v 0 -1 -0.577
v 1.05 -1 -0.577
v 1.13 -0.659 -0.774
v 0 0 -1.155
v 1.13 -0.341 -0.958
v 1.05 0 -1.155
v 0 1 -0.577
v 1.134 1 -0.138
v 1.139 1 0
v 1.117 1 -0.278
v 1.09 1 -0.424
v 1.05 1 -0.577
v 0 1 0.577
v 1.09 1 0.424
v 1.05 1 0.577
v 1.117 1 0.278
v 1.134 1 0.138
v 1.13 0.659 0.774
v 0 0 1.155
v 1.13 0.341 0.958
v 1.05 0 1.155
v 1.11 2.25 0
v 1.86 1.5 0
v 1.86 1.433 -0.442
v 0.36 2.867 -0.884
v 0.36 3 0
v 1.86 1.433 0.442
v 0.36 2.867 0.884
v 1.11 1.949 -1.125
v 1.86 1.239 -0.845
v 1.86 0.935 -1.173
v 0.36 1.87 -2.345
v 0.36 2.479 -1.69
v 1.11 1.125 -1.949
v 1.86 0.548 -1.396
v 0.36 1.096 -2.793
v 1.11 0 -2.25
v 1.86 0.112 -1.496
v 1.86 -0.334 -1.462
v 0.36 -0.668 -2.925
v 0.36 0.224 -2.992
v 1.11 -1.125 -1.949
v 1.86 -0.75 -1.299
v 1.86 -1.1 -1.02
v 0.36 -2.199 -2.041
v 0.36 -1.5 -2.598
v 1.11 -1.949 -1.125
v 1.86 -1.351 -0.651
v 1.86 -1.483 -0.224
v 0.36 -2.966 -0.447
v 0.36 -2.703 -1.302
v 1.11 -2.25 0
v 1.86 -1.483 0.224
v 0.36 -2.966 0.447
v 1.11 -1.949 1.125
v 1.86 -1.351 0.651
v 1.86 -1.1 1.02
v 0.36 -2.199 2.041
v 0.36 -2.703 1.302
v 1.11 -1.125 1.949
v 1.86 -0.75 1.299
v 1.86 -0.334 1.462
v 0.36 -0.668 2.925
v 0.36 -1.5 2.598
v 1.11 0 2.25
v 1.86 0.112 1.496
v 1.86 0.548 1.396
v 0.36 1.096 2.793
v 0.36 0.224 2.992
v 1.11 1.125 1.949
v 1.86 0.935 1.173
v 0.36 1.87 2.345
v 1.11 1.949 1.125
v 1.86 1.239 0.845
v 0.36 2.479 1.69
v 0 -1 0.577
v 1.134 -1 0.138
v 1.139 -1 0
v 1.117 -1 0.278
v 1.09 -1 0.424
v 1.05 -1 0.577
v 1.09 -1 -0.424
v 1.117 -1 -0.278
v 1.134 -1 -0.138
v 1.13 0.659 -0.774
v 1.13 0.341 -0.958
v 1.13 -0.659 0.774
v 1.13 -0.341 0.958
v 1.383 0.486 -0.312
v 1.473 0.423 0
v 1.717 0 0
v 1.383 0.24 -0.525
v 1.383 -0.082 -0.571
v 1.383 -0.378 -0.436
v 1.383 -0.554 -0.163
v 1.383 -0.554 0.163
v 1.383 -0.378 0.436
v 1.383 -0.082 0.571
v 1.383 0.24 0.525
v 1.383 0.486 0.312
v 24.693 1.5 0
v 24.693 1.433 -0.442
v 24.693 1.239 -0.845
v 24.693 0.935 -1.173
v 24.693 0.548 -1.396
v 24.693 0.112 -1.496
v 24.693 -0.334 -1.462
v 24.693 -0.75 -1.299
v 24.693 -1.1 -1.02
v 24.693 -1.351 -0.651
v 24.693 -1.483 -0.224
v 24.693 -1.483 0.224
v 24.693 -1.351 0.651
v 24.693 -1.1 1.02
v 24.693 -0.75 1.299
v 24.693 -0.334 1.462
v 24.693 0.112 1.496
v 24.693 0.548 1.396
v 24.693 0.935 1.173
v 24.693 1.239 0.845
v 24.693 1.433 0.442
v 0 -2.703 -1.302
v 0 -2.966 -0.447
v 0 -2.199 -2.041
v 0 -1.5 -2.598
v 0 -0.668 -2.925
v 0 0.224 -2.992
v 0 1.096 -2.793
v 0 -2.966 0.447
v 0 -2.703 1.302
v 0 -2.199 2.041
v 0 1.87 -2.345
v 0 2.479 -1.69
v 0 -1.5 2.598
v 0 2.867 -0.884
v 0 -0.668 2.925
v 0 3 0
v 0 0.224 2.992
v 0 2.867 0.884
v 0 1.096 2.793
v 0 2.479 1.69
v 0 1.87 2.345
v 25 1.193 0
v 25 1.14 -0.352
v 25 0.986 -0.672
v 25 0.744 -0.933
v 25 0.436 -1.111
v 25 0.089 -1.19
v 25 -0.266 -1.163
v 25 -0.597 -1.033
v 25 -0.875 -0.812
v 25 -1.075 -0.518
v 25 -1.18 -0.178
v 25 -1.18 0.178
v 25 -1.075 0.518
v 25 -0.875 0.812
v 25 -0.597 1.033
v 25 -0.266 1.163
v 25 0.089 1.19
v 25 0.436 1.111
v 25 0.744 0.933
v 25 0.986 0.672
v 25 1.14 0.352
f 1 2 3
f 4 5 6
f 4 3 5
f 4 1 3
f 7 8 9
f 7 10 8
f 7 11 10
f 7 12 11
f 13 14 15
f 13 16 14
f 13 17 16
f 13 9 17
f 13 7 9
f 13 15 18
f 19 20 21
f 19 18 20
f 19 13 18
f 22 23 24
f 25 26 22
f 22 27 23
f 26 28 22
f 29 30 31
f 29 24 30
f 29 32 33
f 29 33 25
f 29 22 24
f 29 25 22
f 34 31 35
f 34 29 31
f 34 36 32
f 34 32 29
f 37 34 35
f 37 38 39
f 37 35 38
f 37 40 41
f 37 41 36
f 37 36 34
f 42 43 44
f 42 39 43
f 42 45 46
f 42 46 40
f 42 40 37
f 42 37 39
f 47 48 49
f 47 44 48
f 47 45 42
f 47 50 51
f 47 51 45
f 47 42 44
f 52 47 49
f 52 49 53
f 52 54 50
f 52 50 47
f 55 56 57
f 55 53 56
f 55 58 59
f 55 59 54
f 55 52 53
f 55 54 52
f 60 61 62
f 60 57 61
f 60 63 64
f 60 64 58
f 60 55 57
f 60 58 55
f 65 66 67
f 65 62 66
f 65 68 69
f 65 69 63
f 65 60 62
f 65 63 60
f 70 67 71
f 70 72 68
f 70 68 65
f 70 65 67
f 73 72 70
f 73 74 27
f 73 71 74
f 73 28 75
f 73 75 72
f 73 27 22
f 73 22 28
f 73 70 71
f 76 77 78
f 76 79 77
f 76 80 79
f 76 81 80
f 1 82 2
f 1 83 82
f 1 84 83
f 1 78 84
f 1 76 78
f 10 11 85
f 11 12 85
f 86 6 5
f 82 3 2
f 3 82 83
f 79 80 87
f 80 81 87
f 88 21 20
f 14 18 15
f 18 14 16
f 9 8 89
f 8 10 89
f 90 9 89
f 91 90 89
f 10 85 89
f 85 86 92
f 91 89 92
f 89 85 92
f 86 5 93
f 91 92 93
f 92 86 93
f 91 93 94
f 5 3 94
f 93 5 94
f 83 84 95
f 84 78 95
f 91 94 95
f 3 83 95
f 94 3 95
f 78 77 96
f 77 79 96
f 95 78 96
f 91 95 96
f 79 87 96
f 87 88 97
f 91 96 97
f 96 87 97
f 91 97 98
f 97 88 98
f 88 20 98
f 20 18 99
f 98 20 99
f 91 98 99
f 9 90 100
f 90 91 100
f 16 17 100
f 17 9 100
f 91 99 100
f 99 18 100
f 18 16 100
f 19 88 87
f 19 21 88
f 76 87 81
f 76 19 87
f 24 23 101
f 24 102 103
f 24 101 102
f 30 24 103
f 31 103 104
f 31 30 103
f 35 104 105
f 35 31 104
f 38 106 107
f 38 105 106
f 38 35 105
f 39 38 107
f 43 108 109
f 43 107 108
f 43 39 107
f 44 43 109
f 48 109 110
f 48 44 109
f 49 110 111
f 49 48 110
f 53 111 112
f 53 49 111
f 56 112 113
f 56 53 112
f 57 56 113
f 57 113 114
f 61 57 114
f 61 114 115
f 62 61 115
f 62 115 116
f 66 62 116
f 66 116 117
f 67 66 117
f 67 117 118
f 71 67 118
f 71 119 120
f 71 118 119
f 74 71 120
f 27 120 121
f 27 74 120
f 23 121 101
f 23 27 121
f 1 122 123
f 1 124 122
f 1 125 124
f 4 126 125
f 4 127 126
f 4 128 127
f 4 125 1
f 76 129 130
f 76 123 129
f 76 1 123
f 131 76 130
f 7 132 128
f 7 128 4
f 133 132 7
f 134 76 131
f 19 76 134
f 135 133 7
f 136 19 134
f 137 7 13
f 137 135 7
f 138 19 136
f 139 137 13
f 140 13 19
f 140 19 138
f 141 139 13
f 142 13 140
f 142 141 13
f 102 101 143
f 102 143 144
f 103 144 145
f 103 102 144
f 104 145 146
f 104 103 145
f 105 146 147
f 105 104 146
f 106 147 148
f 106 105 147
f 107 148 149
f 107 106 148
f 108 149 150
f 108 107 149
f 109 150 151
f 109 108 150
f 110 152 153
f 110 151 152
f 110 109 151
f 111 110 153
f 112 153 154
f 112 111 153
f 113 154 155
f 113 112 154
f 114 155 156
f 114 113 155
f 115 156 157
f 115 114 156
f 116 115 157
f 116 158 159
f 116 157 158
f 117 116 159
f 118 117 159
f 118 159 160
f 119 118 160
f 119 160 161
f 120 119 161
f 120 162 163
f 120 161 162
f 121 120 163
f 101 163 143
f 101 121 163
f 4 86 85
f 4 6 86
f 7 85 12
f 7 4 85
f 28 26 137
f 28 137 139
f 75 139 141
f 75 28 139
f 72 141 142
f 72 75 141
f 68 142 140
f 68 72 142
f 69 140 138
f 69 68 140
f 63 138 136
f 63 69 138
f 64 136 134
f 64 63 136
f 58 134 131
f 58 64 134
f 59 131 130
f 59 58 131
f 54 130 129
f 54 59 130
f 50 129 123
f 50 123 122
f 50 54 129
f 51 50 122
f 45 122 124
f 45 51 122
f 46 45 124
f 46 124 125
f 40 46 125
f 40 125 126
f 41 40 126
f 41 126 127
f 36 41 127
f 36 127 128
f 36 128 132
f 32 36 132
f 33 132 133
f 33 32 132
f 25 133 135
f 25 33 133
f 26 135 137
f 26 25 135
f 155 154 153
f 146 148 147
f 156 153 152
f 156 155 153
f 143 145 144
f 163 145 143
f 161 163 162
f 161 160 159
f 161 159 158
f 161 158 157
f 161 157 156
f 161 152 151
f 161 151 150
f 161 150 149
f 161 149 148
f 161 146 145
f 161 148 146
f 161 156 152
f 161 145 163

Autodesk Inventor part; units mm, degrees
ref_plane "YZ Plane" through (0, 0, 0) normal (1, 0, 0) x (0, 1, 0)
ref_plane "XZ Plane" through (0, 0, 0) normal (0, 1, 0) x (-1, 0, 0)
sketch "Sketch1" plane through (0, 0, 0) normal (0, 0, 1) x (1, 0, 0)
  line L0 (25, 0) -> (25, 1.5)
  line L1 (25, 1.5) -> (7, 1.5)
  line L2 (7, 1.5) -> (6.6933, 1.5)
  line L3 (0, 3) -> (0, 1.1547)
  line L4 (0, 1.1547) -> (1.05, 1.1547)
  line L5 (1.05, 1.1547) -> (1.7167, 0)
  line L6 (1.7167, 0) -> (25, 0)
  line L7 (0, 3) -> (0.36, 3)
  line L8 (0.36, 3) -> (1.86, 1.5)
  line L9 (6.6933, 1.5) -> (1.86, 1.5)
  line L10 (7, 1.5) -> (1.86, 1.5) construction
  line L11 (1.86, 1.5) -> (1.86, 1.5)
  line L12 (-5, 0) -> (30, 0) projected
  line L13 (0, -0.6) -> (0, 3.6) projected
  dimension "d0" = 25
  dimension "d1" = 18
  dimension "d2" = 1.05
  dimension "d3" = 3
  dimension "d6" = 1.86
  dimension "d7" = 45
  dimension "d8" = 2.3094
  dimension "d9" = 60
  dimension "d10" = 6
  dimension "d11" = 3
  dimension "d12" = 0.3067
revolve "Body" add sketch "Sketch1" angle 360 about axis through (1.7167, 0, 0) along (1, 0, 0) contours L6 L5 L4 L3 L7 L8 L9 L2 L1 L0
sketch "Sketch2" plane through (0, 0, 0) normal (-1, 0, 0) x (0, 0, 1)
  circle A0 centre (0, 0) radius 1.1547 projected
  line L0 (0, -4.2) -> (0, 4.2) projected
  line L1 (-4.2, 0) -> (4.2, 0) projected
  line L2 (1.1547, 0) -> (0.5774, -1)
  line L3 (0.5774, -1) -> (-0.5774, -1)
  line L4 (-0.5774, -1) -> (-1.1547, 0)
  line L5 (-1.1547, 0) -> (-0.5774, 1)
  line L6 (-0.5774, 1) -> (0.5774, 1)
  line L7 (0.5774, 1) -> (1.1547, 0)
  point P0 (0, 1.1547)
extrude "Slot" add sketch "Sketch2" against normal up to next contours L7 A0 | A0 L2 | L6 L0 A0 | A0 L0 L3 | L0 L6 A0 | A0 L3 L0 | L4 A0 | A0 L5
thread "Thread" size "M3x0.5" class "6g" standard "ISO Metric profile" length 18
chamfer "Chamfer1" distance 0.3067 distance2 0.3067 1 edges at (25, -1.5, 0) measured on face at (25, 0.0871, 0.3876)
ref_plane "Work Plane1" through (104.775, 0, 0) normal (0, 0, -1) x (1, 0, 0)
equation "\"d15\" = GEL"
equation "\"d17\" = -0.5 * SPD + 0.5 * GD"
equation "\"d18\" = GUL"
equation "\"d0\" = NLG"
equation "\"d1\" = GEL"
equation "\"d2\" = INTI"
equation "\"d3\" = GD"
equation "\"d6\" = KOH"
equation "\"d7\" = 0.5 * SEWI"
equation "\"d8\" = 1.1547 * SW"
equation "\"d10\" = KOD"
equation "\"d11\" = BDM"
equation "\"d12\" = GAL"
equation "\"NLG\" = 25"
equation "\"INTI\" = 1.05"
equation "\"GEL\" = 18"
equation "\"GAL\" = 0.61345 * PTC"
equation "\"KOH\" = 1.86"
equation "\"KOD\" = 6"
equation "\"GUL\" = 0.61345 * PTC"
equation "\"SPD\" = NND - 1.2269 * PTC"
equation "\"BDM\" = NND"
equation "\"GD\" = NND"
equation "\"SEWI\" = 90deg"
equation "\"SW\" = 2"
equation "\"TOA\" = 30deg"
equation "\"GD1\" = THREADDIA - 1.2269 * PTC"
equation "\"EPV\" = 3.36"
equation "\"THREADDIA\" = 3"
equation "\"PTC\" = 0.5"
equation "\"NND\" = 3"
equation "\"E0\" = 1.155 * SW"
properties part number "BS 4168 - M3 x 25" material "Steel, Mild"
